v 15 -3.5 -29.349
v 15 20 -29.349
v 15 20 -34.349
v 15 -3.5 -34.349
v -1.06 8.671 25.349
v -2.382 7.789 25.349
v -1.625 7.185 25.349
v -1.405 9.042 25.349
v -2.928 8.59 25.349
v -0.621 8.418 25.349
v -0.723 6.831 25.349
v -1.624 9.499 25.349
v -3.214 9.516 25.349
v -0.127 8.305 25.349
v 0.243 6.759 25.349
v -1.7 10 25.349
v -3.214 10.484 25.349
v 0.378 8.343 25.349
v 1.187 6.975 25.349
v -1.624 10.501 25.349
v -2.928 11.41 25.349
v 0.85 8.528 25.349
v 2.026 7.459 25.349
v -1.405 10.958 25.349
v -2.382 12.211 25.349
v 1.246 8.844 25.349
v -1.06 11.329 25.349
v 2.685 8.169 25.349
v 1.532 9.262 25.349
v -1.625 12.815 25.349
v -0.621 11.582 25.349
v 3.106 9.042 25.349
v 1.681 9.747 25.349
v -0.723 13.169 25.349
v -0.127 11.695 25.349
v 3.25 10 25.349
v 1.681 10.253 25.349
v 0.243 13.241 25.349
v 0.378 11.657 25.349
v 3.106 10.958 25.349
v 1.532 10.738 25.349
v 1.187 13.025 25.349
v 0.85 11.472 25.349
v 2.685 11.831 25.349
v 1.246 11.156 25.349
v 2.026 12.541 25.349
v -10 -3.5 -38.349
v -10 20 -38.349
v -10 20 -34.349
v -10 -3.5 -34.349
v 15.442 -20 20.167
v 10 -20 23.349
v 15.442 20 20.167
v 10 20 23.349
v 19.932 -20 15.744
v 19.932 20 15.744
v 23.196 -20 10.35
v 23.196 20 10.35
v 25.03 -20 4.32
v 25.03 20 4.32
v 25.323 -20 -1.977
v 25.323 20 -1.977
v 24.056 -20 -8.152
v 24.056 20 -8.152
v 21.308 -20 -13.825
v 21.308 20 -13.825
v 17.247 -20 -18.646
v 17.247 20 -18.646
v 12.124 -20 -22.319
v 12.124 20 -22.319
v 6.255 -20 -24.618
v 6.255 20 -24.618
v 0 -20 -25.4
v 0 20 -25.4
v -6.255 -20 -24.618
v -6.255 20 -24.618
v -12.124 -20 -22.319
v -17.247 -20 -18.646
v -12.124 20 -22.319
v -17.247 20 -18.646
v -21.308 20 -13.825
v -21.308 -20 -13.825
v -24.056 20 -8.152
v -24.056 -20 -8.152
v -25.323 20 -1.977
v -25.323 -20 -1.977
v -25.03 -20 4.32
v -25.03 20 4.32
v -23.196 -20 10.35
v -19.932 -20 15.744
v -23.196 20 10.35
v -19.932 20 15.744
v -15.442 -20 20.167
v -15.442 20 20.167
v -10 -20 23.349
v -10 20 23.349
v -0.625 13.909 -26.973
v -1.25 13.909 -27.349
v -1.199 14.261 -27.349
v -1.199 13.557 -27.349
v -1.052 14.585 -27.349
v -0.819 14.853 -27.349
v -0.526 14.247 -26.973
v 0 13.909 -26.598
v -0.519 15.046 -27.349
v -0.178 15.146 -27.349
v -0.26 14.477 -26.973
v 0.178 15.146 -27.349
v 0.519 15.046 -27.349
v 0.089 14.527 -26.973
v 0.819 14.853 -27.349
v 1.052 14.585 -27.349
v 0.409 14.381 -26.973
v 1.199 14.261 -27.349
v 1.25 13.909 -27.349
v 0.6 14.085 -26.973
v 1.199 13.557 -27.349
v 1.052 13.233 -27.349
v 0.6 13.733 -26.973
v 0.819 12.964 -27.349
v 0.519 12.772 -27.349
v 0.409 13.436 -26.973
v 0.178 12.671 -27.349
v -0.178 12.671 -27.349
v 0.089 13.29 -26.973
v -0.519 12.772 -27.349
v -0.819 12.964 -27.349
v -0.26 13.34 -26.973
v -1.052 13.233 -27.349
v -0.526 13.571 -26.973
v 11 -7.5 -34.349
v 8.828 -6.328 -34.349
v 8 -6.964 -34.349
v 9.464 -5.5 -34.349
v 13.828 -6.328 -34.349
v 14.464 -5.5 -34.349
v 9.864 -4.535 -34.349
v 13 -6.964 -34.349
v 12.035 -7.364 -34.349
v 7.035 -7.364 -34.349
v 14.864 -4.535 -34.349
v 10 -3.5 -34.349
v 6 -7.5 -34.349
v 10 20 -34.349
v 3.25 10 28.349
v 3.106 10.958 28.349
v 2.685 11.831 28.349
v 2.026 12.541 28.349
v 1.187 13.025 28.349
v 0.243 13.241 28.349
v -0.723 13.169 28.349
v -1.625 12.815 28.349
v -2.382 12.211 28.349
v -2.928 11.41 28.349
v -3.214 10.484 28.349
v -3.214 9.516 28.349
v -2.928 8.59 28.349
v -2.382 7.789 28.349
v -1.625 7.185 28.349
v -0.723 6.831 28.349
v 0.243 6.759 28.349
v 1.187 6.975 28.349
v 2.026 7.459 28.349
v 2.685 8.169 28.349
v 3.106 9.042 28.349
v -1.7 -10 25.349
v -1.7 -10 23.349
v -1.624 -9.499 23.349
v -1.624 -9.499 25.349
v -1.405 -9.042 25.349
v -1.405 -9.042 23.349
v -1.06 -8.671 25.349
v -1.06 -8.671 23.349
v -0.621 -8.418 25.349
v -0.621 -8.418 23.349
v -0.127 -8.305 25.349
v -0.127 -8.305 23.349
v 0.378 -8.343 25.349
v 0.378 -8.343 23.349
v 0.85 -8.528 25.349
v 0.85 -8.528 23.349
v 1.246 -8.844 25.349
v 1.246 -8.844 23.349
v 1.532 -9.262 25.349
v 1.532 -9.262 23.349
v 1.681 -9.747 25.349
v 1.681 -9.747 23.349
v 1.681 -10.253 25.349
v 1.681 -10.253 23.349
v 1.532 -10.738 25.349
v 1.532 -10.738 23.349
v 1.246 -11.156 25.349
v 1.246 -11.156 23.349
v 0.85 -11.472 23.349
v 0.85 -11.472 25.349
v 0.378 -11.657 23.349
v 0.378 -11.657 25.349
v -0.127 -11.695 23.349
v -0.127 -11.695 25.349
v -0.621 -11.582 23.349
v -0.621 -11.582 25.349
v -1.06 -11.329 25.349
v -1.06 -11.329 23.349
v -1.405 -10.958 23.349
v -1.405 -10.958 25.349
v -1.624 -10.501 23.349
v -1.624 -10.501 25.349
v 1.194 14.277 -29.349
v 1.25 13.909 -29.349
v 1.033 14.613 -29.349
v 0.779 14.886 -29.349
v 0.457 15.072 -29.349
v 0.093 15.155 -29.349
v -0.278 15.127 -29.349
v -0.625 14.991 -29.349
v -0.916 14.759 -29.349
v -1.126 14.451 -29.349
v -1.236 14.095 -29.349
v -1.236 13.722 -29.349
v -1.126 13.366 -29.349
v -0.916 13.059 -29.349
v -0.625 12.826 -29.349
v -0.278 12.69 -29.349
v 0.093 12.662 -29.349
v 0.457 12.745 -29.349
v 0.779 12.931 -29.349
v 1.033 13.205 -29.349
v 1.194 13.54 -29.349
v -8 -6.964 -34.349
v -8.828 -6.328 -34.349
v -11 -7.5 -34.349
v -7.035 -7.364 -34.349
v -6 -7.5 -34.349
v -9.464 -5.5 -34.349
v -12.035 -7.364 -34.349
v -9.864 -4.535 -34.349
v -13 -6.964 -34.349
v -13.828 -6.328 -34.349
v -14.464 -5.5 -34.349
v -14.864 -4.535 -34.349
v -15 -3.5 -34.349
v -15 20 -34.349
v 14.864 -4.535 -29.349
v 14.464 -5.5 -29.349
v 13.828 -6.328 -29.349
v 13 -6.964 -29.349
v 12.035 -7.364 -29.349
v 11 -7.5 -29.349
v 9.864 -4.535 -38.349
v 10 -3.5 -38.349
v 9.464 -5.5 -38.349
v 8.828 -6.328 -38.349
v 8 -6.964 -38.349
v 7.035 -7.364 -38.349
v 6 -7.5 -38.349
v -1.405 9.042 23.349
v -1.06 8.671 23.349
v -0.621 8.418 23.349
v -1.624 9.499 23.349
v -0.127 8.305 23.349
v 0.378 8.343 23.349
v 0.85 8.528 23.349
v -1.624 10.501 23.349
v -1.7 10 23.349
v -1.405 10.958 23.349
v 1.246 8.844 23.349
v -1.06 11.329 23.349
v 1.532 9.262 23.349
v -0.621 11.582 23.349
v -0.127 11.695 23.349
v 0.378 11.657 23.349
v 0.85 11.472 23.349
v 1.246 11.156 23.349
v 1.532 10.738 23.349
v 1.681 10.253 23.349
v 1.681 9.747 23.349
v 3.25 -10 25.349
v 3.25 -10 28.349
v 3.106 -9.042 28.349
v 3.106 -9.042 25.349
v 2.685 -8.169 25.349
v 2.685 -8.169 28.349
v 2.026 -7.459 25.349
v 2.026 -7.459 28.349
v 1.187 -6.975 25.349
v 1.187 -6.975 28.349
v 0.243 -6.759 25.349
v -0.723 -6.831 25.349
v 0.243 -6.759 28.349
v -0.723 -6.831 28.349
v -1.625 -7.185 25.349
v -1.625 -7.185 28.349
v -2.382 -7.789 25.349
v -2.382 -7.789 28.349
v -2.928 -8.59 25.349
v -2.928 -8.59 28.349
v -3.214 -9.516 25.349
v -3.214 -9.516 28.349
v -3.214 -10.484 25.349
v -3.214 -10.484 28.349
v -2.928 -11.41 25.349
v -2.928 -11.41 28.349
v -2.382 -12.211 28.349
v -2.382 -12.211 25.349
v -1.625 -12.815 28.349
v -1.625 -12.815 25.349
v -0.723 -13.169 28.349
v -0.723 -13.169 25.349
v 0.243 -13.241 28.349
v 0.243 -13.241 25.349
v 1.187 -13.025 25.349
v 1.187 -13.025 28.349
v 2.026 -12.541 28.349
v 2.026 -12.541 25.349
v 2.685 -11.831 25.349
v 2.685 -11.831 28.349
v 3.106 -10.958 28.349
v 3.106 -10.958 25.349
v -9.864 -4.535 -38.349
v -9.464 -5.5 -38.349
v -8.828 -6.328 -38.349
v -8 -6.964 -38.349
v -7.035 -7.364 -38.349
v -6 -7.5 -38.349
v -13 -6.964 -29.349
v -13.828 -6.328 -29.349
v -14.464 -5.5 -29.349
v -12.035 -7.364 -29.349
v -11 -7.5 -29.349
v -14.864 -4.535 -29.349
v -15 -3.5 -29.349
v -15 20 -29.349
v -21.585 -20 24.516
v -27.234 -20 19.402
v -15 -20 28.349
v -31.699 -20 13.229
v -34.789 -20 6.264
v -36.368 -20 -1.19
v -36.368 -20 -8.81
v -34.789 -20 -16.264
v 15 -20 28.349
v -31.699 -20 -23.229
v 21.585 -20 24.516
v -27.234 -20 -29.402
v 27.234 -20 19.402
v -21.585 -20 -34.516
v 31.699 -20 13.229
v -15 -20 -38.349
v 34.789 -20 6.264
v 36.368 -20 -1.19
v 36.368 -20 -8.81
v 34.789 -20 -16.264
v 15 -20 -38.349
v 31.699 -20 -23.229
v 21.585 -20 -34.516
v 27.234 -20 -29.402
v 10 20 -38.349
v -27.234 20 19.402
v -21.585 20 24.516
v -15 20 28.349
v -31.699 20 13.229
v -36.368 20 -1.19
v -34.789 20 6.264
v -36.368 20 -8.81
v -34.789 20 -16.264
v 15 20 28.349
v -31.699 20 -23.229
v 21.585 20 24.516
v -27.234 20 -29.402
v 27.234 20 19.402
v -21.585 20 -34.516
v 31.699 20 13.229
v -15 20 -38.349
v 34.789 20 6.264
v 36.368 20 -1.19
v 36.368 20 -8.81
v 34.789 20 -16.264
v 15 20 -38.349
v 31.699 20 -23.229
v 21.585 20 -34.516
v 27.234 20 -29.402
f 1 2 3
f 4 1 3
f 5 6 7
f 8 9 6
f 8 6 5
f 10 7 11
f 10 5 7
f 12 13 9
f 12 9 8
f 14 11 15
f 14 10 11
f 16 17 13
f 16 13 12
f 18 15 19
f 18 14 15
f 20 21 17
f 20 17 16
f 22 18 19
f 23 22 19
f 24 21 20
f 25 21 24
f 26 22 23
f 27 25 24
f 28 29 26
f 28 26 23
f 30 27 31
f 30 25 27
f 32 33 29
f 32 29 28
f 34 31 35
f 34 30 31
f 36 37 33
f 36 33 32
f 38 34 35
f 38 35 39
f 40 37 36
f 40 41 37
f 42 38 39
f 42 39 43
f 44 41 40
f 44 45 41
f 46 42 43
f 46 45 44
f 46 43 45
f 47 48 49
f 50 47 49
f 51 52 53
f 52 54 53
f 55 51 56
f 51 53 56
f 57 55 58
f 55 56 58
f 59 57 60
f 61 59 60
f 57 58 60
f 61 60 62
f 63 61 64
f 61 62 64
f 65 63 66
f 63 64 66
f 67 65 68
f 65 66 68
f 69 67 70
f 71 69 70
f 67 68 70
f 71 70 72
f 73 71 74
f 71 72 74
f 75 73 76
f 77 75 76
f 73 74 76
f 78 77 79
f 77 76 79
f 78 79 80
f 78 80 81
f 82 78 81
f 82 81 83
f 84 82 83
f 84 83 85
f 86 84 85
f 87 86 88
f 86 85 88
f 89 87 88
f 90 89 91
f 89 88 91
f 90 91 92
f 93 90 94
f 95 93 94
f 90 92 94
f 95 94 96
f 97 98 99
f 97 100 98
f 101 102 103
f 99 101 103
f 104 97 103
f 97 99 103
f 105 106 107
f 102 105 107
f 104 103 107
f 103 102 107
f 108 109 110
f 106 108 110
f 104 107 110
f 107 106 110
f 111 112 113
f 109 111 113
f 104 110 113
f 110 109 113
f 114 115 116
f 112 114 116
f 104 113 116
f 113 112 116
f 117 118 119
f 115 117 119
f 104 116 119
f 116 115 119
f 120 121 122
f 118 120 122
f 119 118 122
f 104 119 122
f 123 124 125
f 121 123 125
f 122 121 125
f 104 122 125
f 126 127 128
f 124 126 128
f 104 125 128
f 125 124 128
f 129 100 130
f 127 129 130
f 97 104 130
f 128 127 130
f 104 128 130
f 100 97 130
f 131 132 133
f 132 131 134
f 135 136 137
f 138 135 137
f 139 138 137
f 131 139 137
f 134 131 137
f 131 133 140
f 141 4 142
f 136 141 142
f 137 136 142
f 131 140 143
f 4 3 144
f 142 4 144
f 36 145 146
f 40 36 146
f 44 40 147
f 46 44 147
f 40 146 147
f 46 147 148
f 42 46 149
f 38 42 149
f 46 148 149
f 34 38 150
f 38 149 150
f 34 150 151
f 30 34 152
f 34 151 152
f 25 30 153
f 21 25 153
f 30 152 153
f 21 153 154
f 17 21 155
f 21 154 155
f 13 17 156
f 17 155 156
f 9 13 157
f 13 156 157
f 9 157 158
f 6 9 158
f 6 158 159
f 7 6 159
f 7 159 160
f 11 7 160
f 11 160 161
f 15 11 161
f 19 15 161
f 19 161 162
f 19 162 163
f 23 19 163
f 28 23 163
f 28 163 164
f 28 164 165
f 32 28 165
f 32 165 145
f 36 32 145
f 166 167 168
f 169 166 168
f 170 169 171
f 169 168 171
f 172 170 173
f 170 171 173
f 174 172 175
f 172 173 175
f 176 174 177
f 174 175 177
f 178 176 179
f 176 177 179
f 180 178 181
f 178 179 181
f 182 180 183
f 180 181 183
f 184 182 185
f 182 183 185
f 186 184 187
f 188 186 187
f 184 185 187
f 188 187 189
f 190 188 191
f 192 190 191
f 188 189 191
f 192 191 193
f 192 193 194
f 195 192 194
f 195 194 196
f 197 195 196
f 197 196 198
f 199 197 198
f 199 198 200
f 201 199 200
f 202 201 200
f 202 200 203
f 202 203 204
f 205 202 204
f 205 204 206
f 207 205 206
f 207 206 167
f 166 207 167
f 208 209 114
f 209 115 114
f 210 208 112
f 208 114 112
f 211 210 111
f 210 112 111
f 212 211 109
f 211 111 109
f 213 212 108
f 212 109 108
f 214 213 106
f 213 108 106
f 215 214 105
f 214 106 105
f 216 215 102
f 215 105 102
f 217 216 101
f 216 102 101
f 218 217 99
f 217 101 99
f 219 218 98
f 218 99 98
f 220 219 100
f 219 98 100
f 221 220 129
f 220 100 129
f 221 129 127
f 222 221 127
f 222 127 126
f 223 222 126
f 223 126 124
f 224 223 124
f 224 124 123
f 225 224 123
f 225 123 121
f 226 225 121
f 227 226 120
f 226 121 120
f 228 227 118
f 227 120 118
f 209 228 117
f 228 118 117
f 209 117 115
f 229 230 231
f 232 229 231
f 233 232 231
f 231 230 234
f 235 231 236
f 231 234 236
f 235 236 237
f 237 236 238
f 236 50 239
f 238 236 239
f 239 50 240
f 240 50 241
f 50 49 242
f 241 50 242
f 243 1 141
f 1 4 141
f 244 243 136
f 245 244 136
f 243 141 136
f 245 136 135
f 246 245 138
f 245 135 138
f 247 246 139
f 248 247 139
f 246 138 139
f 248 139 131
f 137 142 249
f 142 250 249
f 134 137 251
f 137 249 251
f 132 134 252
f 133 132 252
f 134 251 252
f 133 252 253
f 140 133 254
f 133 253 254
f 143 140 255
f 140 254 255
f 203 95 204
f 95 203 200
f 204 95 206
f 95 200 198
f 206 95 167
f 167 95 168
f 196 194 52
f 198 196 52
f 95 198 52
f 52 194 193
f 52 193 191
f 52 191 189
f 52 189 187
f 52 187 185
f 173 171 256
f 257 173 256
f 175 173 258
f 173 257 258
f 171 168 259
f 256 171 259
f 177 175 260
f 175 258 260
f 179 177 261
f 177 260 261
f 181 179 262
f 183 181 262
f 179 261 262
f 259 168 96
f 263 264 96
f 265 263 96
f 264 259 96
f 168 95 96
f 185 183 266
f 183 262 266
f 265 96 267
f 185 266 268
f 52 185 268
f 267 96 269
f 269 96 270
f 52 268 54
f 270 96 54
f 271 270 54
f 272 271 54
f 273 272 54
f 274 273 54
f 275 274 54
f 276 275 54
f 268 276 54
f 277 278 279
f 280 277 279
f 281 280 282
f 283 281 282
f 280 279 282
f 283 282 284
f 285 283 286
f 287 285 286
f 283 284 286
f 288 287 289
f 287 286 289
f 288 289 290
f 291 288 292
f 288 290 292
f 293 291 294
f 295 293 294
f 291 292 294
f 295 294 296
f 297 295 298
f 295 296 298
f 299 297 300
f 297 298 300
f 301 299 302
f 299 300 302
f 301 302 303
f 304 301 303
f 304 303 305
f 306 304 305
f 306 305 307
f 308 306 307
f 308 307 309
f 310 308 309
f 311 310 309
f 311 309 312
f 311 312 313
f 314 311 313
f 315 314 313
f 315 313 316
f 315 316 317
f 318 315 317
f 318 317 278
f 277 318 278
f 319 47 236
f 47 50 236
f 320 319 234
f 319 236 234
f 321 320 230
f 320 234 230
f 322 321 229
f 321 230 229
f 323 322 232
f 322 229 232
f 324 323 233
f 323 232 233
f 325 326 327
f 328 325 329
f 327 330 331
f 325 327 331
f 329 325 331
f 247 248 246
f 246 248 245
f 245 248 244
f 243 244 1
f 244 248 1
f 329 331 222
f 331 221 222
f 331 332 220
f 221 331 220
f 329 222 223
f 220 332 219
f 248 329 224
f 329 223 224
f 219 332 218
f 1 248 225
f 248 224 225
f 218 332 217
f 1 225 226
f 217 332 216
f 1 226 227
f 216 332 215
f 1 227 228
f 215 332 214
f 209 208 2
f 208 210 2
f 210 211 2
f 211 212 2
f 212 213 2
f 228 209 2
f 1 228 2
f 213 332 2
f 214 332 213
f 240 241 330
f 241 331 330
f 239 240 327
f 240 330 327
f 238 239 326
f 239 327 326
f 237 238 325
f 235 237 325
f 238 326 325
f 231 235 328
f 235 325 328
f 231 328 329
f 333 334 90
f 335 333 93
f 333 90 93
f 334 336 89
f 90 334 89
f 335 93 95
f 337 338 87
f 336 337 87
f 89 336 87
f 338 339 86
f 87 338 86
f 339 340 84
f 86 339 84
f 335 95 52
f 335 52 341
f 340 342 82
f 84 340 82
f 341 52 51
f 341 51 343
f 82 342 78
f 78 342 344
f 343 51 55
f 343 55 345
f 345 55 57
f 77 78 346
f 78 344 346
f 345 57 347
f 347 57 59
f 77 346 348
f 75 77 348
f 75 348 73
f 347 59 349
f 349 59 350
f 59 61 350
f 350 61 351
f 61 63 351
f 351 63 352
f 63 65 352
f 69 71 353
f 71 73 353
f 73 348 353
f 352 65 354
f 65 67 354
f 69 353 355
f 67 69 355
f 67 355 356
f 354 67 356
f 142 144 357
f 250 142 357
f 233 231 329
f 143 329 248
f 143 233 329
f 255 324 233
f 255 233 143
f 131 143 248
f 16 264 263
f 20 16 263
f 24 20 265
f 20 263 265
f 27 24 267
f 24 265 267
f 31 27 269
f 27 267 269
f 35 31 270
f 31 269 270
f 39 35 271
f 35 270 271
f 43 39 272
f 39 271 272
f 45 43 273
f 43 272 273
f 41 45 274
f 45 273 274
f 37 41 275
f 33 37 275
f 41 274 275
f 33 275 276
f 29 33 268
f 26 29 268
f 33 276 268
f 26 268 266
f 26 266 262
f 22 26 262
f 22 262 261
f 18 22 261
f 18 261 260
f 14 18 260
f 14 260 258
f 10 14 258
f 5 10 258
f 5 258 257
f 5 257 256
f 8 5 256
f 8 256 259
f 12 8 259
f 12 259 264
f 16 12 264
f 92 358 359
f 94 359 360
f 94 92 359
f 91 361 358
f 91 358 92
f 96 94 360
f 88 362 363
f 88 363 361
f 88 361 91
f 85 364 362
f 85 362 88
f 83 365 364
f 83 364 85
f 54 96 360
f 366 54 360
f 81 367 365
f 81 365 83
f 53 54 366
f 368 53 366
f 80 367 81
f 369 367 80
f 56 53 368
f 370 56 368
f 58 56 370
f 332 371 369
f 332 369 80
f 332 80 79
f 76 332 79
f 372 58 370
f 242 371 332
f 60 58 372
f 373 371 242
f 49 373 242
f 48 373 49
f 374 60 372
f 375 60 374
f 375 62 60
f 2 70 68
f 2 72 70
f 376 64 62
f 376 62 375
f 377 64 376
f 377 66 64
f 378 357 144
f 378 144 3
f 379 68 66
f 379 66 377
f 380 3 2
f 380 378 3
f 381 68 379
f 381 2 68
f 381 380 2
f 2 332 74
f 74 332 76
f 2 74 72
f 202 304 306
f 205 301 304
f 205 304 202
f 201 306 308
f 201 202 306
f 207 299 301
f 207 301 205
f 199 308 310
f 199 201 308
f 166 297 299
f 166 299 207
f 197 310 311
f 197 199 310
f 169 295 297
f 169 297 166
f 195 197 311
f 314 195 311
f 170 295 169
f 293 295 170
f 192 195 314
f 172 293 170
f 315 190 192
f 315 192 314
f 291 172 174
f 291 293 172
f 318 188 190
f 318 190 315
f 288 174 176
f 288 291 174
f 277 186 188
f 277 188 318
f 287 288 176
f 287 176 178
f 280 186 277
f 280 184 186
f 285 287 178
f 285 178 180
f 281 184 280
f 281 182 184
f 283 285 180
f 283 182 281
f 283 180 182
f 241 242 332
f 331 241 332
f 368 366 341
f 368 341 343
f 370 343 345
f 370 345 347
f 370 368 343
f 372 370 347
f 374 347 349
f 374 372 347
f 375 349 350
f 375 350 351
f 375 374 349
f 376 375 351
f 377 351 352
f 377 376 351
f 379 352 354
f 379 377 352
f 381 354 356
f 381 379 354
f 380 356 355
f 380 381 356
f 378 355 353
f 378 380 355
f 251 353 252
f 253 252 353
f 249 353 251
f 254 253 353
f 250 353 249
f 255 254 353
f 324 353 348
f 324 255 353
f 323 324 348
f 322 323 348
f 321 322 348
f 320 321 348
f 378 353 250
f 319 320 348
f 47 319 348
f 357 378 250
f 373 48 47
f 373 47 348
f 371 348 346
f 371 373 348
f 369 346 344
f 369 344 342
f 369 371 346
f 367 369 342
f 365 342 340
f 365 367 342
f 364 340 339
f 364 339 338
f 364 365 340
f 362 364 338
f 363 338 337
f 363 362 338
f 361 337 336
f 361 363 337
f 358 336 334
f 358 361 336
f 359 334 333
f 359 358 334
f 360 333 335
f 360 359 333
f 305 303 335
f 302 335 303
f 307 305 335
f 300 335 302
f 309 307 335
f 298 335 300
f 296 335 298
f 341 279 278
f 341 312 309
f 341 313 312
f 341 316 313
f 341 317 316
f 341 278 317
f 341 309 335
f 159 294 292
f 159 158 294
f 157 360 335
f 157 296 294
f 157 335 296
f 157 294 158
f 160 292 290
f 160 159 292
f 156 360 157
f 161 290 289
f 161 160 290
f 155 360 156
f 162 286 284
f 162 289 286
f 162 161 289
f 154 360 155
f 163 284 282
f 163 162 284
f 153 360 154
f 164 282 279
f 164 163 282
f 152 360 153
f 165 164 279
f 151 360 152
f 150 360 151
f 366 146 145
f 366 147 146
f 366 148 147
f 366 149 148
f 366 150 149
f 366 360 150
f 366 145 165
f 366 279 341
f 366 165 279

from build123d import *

# Parameters (mm, degrees)
BOSS_EXTRUDE1_DEPTH            = 20
CUT_EXTRUDE1_DEPTH             = 27.5
FILLET1_R                      = 4
CBORE_FOR_M3_SHCS1_D           = 3.4
CBORE_FOR_M3_SHCS1_DEPTH       = 5
CBORE_FOR_M3_SHCS1_CBORE_D     = 6.5
CBORE_FOR_M3_SHCS1_CBORE_DEPTH = 3
M3X0_5_TAPPED_HOLE1_D          = 2.5
M3X0_5_TAPPED_HOLE1_DEPTH      = 11
M3X0_5_TAPPED_HOLE1_TIP        = 0.751075774


with BuildPart() as part:
    # Sketch1 → Boss-Extrude1 (new body, symmetric)
    with BuildSketch(Plane(origin=(0, 0, 0), x_dir=(1, 0, 0), z_dir=(0, 1, 0))):
        with BuildLine():
            Line((-15, -28.348661632), (15, -28.348661632))
            ThreePointArc((15, -28.348661632), (36.566832412, 5), (15, 38.348661632))
            Line((15, 38.348661632), (-15, 38.348661632))
            ThreePointArc((-15, 38.348661632), (-36.566832412, 5), (-15, -28.348661632))
        make_face()
        with BuildLine():
            Line((-10, -23.348661632), (10, -23.348661632))
            ThreePointArc((10, -23.348661632), (0, 25.4), (-10, -23.348661632))
        make_face(mode=Mode.SUBTRACT)
    extrude(amount=BOSS_EXTRUDE1_DEPTH, both=True)

    # Sketch3 → Cut-Extrude1 (cut)
    with BuildSketch(Plane(origin=(0, 20, 0), x_dir=(1, 0, 0), z_dir=(0, 1, 0))):
        Polygon((-10, 38.348661632), (-10, 34.348661632), (-15, 34.348661632), (-15, 29.348661632), (15, 29.348661632), (15, 34.348661632), (10, 34.348661632), (10, 38.348661632), align=None)
    extrude(amount=-CUT_EXTRUDE1_DEPTH, mode=Mode.SUBTRACT)

    # Fillet1
    fillet1_edges = [part.edges().sort_by_distance(p)[0] for p in [
        (10, -7.5, -36.348661632),
        (15, -7.5, -31.848661632),
        (-15, -7.5, -31.848661632),
        (-10, -7.5, -36.348661632),
    ]]
    fillet(fillet1_edges, radius=FILLET1_R)

    # CBORE for M3 SHCS1
    with Locations(Plane.XY.offset(28.348661632)):
        with Locations((0, 10), (0, -10)):
            CounterBoreHole(CBORE_FOR_M3_SHCS1_D / 2, CBORE_FOR_M3_SHCS1_CBORE_D / 2, CBORE_FOR_M3_SHCS1_CBORE_DEPTH, depth=CBORE_FOR_M3_SHCS1_DEPTH)

    # M3x0.5 Tapped Hole1
    with Locations(Plane(origin=(0, 0, -38.348661632), x_dir=(-1, 0, 0), z_dir=(0, 0, -1))):
        with Locations((0, 13.90875121)):
            Hole(M3X0_5_TAPPED_HOLE1_D / 2, depth=M3X0_5_TAPPED_HOLE1_DEPTH)
            with Locations((0, 0, -(M3X0_5_TAPPED_HOLE1_DEPTH + M3X0_5_TAPPED_HOLE1_TIP / 2))):  # 118° drill point
                Cone(0, M3X0_5_TAPPED_HOLE1_D / 2, M3X0_5_TAPPED_HOLE1_TIP, mode=Mode.SUBTRACT)


solid = part.part
